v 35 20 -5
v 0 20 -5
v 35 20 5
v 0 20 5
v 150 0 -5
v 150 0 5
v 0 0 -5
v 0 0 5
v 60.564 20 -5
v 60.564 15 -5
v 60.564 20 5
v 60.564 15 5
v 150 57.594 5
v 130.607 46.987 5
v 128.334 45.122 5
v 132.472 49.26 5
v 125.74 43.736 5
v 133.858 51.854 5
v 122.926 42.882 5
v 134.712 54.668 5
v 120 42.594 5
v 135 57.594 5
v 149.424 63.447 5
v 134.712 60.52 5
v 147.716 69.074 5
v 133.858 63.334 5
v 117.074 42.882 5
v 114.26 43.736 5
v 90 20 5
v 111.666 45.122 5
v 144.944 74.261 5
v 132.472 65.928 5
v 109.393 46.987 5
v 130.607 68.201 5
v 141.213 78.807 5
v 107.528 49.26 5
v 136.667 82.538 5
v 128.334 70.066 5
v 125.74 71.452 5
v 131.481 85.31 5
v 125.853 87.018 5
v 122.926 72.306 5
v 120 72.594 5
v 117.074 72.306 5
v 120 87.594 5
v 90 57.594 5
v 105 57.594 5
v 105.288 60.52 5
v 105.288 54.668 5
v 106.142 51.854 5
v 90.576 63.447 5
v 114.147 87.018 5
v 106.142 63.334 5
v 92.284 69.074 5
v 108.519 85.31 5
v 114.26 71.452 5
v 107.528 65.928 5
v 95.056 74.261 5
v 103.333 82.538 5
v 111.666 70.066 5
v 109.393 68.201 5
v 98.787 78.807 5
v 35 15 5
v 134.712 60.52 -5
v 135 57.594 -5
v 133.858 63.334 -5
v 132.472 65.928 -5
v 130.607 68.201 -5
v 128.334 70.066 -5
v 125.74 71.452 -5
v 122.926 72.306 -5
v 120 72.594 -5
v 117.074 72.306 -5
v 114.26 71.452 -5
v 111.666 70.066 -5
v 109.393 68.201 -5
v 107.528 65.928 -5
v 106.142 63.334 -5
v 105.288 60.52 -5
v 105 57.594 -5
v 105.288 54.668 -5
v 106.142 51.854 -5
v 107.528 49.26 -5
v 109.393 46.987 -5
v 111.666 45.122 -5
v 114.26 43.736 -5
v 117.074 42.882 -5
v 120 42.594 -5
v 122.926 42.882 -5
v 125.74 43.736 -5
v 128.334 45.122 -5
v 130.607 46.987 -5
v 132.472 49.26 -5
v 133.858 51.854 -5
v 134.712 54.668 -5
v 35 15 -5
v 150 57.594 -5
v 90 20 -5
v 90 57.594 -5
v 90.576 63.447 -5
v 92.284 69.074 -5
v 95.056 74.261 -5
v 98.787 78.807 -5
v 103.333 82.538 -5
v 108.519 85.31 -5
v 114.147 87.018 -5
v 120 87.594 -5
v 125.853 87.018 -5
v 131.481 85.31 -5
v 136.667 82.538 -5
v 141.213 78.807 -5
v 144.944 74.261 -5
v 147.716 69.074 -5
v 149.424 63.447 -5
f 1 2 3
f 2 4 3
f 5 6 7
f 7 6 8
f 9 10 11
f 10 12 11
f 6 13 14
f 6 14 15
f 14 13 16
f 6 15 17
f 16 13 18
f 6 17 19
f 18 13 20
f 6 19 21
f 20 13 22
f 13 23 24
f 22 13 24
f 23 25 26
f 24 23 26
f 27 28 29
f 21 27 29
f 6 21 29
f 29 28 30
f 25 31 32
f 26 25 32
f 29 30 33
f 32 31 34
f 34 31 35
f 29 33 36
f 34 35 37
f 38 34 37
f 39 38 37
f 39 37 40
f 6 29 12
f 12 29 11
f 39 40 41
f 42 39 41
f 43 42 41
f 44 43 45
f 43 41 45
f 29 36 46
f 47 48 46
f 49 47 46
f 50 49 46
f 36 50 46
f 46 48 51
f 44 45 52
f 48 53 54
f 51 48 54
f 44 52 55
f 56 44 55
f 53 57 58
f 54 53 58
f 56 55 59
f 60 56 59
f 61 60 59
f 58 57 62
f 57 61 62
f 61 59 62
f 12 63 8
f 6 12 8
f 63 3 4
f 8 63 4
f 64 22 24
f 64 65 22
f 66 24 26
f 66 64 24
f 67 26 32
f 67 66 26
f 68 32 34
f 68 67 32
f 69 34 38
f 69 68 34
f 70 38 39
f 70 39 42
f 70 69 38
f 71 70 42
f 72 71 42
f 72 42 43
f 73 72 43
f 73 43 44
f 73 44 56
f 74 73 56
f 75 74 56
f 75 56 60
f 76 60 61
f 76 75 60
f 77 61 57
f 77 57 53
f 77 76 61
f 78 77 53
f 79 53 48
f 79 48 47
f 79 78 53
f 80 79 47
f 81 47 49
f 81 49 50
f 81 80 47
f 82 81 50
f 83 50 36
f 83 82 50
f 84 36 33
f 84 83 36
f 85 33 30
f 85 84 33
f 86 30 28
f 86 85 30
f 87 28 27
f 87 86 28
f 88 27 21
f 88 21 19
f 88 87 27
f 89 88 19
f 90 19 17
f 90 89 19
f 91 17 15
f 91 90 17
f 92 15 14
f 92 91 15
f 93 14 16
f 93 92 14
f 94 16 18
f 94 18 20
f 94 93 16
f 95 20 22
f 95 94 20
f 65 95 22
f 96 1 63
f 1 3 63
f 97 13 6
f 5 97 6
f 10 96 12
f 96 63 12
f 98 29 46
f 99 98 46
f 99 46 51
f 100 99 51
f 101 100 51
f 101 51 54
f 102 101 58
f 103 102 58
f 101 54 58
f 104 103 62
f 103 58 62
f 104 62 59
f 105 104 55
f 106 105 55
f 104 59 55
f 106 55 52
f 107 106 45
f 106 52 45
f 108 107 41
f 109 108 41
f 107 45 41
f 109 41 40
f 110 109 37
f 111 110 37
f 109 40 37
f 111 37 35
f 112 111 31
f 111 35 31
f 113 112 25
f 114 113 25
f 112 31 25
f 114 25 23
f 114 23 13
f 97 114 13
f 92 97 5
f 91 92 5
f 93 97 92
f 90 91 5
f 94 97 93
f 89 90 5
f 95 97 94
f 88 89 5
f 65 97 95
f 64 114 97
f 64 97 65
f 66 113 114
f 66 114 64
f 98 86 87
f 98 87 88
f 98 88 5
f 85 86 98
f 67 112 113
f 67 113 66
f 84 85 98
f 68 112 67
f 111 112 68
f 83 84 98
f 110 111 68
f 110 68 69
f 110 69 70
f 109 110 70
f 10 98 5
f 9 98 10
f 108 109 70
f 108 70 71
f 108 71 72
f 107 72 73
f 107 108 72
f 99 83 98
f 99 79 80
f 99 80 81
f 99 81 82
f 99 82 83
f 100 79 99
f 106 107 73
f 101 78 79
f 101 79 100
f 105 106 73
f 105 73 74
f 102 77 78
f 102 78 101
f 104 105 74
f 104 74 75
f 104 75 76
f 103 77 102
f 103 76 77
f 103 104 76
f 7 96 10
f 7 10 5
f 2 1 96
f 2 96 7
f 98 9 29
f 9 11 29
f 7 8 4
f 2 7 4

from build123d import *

# Parameters (mm, degrees)
SKETCH1_R           = 15
BOSS_EXTRUDE3_DEPTH = 5


with BuildPart() as part:
    # Sketch1 → Boss-Extrude3 (new, symmetric)
    with BuildSketch(Plane.XY):
        with BuildLine():
            Line((0, 0), (0, 20))
            Line((0, 20), (35, 20))
            Line((35, 20), (35, 15))
            Line((35, 15), (60.563909774, 15))
            Line((60.563909774, 15), (60.563909774, 20))
            Line((60.563909774, 20), (90, 20))
            Line((90, 20), (90, 57.593984962))
            ThreePointArc((90, 57.593984962), (120, 87.593984962), (150, 57.593984962))
            Line((150, 57.593984962), (150, 0))
            Line((150, 0), (0, 0))
        make_face()
        with Locations((120, 57.593984962)):
            Circle(SKETCH1_R, mode=Mode.SUBTRACT)
    extrude(amount=BOSS_EXTRUDE3_DEPTH, both=True)


solid = part.part
